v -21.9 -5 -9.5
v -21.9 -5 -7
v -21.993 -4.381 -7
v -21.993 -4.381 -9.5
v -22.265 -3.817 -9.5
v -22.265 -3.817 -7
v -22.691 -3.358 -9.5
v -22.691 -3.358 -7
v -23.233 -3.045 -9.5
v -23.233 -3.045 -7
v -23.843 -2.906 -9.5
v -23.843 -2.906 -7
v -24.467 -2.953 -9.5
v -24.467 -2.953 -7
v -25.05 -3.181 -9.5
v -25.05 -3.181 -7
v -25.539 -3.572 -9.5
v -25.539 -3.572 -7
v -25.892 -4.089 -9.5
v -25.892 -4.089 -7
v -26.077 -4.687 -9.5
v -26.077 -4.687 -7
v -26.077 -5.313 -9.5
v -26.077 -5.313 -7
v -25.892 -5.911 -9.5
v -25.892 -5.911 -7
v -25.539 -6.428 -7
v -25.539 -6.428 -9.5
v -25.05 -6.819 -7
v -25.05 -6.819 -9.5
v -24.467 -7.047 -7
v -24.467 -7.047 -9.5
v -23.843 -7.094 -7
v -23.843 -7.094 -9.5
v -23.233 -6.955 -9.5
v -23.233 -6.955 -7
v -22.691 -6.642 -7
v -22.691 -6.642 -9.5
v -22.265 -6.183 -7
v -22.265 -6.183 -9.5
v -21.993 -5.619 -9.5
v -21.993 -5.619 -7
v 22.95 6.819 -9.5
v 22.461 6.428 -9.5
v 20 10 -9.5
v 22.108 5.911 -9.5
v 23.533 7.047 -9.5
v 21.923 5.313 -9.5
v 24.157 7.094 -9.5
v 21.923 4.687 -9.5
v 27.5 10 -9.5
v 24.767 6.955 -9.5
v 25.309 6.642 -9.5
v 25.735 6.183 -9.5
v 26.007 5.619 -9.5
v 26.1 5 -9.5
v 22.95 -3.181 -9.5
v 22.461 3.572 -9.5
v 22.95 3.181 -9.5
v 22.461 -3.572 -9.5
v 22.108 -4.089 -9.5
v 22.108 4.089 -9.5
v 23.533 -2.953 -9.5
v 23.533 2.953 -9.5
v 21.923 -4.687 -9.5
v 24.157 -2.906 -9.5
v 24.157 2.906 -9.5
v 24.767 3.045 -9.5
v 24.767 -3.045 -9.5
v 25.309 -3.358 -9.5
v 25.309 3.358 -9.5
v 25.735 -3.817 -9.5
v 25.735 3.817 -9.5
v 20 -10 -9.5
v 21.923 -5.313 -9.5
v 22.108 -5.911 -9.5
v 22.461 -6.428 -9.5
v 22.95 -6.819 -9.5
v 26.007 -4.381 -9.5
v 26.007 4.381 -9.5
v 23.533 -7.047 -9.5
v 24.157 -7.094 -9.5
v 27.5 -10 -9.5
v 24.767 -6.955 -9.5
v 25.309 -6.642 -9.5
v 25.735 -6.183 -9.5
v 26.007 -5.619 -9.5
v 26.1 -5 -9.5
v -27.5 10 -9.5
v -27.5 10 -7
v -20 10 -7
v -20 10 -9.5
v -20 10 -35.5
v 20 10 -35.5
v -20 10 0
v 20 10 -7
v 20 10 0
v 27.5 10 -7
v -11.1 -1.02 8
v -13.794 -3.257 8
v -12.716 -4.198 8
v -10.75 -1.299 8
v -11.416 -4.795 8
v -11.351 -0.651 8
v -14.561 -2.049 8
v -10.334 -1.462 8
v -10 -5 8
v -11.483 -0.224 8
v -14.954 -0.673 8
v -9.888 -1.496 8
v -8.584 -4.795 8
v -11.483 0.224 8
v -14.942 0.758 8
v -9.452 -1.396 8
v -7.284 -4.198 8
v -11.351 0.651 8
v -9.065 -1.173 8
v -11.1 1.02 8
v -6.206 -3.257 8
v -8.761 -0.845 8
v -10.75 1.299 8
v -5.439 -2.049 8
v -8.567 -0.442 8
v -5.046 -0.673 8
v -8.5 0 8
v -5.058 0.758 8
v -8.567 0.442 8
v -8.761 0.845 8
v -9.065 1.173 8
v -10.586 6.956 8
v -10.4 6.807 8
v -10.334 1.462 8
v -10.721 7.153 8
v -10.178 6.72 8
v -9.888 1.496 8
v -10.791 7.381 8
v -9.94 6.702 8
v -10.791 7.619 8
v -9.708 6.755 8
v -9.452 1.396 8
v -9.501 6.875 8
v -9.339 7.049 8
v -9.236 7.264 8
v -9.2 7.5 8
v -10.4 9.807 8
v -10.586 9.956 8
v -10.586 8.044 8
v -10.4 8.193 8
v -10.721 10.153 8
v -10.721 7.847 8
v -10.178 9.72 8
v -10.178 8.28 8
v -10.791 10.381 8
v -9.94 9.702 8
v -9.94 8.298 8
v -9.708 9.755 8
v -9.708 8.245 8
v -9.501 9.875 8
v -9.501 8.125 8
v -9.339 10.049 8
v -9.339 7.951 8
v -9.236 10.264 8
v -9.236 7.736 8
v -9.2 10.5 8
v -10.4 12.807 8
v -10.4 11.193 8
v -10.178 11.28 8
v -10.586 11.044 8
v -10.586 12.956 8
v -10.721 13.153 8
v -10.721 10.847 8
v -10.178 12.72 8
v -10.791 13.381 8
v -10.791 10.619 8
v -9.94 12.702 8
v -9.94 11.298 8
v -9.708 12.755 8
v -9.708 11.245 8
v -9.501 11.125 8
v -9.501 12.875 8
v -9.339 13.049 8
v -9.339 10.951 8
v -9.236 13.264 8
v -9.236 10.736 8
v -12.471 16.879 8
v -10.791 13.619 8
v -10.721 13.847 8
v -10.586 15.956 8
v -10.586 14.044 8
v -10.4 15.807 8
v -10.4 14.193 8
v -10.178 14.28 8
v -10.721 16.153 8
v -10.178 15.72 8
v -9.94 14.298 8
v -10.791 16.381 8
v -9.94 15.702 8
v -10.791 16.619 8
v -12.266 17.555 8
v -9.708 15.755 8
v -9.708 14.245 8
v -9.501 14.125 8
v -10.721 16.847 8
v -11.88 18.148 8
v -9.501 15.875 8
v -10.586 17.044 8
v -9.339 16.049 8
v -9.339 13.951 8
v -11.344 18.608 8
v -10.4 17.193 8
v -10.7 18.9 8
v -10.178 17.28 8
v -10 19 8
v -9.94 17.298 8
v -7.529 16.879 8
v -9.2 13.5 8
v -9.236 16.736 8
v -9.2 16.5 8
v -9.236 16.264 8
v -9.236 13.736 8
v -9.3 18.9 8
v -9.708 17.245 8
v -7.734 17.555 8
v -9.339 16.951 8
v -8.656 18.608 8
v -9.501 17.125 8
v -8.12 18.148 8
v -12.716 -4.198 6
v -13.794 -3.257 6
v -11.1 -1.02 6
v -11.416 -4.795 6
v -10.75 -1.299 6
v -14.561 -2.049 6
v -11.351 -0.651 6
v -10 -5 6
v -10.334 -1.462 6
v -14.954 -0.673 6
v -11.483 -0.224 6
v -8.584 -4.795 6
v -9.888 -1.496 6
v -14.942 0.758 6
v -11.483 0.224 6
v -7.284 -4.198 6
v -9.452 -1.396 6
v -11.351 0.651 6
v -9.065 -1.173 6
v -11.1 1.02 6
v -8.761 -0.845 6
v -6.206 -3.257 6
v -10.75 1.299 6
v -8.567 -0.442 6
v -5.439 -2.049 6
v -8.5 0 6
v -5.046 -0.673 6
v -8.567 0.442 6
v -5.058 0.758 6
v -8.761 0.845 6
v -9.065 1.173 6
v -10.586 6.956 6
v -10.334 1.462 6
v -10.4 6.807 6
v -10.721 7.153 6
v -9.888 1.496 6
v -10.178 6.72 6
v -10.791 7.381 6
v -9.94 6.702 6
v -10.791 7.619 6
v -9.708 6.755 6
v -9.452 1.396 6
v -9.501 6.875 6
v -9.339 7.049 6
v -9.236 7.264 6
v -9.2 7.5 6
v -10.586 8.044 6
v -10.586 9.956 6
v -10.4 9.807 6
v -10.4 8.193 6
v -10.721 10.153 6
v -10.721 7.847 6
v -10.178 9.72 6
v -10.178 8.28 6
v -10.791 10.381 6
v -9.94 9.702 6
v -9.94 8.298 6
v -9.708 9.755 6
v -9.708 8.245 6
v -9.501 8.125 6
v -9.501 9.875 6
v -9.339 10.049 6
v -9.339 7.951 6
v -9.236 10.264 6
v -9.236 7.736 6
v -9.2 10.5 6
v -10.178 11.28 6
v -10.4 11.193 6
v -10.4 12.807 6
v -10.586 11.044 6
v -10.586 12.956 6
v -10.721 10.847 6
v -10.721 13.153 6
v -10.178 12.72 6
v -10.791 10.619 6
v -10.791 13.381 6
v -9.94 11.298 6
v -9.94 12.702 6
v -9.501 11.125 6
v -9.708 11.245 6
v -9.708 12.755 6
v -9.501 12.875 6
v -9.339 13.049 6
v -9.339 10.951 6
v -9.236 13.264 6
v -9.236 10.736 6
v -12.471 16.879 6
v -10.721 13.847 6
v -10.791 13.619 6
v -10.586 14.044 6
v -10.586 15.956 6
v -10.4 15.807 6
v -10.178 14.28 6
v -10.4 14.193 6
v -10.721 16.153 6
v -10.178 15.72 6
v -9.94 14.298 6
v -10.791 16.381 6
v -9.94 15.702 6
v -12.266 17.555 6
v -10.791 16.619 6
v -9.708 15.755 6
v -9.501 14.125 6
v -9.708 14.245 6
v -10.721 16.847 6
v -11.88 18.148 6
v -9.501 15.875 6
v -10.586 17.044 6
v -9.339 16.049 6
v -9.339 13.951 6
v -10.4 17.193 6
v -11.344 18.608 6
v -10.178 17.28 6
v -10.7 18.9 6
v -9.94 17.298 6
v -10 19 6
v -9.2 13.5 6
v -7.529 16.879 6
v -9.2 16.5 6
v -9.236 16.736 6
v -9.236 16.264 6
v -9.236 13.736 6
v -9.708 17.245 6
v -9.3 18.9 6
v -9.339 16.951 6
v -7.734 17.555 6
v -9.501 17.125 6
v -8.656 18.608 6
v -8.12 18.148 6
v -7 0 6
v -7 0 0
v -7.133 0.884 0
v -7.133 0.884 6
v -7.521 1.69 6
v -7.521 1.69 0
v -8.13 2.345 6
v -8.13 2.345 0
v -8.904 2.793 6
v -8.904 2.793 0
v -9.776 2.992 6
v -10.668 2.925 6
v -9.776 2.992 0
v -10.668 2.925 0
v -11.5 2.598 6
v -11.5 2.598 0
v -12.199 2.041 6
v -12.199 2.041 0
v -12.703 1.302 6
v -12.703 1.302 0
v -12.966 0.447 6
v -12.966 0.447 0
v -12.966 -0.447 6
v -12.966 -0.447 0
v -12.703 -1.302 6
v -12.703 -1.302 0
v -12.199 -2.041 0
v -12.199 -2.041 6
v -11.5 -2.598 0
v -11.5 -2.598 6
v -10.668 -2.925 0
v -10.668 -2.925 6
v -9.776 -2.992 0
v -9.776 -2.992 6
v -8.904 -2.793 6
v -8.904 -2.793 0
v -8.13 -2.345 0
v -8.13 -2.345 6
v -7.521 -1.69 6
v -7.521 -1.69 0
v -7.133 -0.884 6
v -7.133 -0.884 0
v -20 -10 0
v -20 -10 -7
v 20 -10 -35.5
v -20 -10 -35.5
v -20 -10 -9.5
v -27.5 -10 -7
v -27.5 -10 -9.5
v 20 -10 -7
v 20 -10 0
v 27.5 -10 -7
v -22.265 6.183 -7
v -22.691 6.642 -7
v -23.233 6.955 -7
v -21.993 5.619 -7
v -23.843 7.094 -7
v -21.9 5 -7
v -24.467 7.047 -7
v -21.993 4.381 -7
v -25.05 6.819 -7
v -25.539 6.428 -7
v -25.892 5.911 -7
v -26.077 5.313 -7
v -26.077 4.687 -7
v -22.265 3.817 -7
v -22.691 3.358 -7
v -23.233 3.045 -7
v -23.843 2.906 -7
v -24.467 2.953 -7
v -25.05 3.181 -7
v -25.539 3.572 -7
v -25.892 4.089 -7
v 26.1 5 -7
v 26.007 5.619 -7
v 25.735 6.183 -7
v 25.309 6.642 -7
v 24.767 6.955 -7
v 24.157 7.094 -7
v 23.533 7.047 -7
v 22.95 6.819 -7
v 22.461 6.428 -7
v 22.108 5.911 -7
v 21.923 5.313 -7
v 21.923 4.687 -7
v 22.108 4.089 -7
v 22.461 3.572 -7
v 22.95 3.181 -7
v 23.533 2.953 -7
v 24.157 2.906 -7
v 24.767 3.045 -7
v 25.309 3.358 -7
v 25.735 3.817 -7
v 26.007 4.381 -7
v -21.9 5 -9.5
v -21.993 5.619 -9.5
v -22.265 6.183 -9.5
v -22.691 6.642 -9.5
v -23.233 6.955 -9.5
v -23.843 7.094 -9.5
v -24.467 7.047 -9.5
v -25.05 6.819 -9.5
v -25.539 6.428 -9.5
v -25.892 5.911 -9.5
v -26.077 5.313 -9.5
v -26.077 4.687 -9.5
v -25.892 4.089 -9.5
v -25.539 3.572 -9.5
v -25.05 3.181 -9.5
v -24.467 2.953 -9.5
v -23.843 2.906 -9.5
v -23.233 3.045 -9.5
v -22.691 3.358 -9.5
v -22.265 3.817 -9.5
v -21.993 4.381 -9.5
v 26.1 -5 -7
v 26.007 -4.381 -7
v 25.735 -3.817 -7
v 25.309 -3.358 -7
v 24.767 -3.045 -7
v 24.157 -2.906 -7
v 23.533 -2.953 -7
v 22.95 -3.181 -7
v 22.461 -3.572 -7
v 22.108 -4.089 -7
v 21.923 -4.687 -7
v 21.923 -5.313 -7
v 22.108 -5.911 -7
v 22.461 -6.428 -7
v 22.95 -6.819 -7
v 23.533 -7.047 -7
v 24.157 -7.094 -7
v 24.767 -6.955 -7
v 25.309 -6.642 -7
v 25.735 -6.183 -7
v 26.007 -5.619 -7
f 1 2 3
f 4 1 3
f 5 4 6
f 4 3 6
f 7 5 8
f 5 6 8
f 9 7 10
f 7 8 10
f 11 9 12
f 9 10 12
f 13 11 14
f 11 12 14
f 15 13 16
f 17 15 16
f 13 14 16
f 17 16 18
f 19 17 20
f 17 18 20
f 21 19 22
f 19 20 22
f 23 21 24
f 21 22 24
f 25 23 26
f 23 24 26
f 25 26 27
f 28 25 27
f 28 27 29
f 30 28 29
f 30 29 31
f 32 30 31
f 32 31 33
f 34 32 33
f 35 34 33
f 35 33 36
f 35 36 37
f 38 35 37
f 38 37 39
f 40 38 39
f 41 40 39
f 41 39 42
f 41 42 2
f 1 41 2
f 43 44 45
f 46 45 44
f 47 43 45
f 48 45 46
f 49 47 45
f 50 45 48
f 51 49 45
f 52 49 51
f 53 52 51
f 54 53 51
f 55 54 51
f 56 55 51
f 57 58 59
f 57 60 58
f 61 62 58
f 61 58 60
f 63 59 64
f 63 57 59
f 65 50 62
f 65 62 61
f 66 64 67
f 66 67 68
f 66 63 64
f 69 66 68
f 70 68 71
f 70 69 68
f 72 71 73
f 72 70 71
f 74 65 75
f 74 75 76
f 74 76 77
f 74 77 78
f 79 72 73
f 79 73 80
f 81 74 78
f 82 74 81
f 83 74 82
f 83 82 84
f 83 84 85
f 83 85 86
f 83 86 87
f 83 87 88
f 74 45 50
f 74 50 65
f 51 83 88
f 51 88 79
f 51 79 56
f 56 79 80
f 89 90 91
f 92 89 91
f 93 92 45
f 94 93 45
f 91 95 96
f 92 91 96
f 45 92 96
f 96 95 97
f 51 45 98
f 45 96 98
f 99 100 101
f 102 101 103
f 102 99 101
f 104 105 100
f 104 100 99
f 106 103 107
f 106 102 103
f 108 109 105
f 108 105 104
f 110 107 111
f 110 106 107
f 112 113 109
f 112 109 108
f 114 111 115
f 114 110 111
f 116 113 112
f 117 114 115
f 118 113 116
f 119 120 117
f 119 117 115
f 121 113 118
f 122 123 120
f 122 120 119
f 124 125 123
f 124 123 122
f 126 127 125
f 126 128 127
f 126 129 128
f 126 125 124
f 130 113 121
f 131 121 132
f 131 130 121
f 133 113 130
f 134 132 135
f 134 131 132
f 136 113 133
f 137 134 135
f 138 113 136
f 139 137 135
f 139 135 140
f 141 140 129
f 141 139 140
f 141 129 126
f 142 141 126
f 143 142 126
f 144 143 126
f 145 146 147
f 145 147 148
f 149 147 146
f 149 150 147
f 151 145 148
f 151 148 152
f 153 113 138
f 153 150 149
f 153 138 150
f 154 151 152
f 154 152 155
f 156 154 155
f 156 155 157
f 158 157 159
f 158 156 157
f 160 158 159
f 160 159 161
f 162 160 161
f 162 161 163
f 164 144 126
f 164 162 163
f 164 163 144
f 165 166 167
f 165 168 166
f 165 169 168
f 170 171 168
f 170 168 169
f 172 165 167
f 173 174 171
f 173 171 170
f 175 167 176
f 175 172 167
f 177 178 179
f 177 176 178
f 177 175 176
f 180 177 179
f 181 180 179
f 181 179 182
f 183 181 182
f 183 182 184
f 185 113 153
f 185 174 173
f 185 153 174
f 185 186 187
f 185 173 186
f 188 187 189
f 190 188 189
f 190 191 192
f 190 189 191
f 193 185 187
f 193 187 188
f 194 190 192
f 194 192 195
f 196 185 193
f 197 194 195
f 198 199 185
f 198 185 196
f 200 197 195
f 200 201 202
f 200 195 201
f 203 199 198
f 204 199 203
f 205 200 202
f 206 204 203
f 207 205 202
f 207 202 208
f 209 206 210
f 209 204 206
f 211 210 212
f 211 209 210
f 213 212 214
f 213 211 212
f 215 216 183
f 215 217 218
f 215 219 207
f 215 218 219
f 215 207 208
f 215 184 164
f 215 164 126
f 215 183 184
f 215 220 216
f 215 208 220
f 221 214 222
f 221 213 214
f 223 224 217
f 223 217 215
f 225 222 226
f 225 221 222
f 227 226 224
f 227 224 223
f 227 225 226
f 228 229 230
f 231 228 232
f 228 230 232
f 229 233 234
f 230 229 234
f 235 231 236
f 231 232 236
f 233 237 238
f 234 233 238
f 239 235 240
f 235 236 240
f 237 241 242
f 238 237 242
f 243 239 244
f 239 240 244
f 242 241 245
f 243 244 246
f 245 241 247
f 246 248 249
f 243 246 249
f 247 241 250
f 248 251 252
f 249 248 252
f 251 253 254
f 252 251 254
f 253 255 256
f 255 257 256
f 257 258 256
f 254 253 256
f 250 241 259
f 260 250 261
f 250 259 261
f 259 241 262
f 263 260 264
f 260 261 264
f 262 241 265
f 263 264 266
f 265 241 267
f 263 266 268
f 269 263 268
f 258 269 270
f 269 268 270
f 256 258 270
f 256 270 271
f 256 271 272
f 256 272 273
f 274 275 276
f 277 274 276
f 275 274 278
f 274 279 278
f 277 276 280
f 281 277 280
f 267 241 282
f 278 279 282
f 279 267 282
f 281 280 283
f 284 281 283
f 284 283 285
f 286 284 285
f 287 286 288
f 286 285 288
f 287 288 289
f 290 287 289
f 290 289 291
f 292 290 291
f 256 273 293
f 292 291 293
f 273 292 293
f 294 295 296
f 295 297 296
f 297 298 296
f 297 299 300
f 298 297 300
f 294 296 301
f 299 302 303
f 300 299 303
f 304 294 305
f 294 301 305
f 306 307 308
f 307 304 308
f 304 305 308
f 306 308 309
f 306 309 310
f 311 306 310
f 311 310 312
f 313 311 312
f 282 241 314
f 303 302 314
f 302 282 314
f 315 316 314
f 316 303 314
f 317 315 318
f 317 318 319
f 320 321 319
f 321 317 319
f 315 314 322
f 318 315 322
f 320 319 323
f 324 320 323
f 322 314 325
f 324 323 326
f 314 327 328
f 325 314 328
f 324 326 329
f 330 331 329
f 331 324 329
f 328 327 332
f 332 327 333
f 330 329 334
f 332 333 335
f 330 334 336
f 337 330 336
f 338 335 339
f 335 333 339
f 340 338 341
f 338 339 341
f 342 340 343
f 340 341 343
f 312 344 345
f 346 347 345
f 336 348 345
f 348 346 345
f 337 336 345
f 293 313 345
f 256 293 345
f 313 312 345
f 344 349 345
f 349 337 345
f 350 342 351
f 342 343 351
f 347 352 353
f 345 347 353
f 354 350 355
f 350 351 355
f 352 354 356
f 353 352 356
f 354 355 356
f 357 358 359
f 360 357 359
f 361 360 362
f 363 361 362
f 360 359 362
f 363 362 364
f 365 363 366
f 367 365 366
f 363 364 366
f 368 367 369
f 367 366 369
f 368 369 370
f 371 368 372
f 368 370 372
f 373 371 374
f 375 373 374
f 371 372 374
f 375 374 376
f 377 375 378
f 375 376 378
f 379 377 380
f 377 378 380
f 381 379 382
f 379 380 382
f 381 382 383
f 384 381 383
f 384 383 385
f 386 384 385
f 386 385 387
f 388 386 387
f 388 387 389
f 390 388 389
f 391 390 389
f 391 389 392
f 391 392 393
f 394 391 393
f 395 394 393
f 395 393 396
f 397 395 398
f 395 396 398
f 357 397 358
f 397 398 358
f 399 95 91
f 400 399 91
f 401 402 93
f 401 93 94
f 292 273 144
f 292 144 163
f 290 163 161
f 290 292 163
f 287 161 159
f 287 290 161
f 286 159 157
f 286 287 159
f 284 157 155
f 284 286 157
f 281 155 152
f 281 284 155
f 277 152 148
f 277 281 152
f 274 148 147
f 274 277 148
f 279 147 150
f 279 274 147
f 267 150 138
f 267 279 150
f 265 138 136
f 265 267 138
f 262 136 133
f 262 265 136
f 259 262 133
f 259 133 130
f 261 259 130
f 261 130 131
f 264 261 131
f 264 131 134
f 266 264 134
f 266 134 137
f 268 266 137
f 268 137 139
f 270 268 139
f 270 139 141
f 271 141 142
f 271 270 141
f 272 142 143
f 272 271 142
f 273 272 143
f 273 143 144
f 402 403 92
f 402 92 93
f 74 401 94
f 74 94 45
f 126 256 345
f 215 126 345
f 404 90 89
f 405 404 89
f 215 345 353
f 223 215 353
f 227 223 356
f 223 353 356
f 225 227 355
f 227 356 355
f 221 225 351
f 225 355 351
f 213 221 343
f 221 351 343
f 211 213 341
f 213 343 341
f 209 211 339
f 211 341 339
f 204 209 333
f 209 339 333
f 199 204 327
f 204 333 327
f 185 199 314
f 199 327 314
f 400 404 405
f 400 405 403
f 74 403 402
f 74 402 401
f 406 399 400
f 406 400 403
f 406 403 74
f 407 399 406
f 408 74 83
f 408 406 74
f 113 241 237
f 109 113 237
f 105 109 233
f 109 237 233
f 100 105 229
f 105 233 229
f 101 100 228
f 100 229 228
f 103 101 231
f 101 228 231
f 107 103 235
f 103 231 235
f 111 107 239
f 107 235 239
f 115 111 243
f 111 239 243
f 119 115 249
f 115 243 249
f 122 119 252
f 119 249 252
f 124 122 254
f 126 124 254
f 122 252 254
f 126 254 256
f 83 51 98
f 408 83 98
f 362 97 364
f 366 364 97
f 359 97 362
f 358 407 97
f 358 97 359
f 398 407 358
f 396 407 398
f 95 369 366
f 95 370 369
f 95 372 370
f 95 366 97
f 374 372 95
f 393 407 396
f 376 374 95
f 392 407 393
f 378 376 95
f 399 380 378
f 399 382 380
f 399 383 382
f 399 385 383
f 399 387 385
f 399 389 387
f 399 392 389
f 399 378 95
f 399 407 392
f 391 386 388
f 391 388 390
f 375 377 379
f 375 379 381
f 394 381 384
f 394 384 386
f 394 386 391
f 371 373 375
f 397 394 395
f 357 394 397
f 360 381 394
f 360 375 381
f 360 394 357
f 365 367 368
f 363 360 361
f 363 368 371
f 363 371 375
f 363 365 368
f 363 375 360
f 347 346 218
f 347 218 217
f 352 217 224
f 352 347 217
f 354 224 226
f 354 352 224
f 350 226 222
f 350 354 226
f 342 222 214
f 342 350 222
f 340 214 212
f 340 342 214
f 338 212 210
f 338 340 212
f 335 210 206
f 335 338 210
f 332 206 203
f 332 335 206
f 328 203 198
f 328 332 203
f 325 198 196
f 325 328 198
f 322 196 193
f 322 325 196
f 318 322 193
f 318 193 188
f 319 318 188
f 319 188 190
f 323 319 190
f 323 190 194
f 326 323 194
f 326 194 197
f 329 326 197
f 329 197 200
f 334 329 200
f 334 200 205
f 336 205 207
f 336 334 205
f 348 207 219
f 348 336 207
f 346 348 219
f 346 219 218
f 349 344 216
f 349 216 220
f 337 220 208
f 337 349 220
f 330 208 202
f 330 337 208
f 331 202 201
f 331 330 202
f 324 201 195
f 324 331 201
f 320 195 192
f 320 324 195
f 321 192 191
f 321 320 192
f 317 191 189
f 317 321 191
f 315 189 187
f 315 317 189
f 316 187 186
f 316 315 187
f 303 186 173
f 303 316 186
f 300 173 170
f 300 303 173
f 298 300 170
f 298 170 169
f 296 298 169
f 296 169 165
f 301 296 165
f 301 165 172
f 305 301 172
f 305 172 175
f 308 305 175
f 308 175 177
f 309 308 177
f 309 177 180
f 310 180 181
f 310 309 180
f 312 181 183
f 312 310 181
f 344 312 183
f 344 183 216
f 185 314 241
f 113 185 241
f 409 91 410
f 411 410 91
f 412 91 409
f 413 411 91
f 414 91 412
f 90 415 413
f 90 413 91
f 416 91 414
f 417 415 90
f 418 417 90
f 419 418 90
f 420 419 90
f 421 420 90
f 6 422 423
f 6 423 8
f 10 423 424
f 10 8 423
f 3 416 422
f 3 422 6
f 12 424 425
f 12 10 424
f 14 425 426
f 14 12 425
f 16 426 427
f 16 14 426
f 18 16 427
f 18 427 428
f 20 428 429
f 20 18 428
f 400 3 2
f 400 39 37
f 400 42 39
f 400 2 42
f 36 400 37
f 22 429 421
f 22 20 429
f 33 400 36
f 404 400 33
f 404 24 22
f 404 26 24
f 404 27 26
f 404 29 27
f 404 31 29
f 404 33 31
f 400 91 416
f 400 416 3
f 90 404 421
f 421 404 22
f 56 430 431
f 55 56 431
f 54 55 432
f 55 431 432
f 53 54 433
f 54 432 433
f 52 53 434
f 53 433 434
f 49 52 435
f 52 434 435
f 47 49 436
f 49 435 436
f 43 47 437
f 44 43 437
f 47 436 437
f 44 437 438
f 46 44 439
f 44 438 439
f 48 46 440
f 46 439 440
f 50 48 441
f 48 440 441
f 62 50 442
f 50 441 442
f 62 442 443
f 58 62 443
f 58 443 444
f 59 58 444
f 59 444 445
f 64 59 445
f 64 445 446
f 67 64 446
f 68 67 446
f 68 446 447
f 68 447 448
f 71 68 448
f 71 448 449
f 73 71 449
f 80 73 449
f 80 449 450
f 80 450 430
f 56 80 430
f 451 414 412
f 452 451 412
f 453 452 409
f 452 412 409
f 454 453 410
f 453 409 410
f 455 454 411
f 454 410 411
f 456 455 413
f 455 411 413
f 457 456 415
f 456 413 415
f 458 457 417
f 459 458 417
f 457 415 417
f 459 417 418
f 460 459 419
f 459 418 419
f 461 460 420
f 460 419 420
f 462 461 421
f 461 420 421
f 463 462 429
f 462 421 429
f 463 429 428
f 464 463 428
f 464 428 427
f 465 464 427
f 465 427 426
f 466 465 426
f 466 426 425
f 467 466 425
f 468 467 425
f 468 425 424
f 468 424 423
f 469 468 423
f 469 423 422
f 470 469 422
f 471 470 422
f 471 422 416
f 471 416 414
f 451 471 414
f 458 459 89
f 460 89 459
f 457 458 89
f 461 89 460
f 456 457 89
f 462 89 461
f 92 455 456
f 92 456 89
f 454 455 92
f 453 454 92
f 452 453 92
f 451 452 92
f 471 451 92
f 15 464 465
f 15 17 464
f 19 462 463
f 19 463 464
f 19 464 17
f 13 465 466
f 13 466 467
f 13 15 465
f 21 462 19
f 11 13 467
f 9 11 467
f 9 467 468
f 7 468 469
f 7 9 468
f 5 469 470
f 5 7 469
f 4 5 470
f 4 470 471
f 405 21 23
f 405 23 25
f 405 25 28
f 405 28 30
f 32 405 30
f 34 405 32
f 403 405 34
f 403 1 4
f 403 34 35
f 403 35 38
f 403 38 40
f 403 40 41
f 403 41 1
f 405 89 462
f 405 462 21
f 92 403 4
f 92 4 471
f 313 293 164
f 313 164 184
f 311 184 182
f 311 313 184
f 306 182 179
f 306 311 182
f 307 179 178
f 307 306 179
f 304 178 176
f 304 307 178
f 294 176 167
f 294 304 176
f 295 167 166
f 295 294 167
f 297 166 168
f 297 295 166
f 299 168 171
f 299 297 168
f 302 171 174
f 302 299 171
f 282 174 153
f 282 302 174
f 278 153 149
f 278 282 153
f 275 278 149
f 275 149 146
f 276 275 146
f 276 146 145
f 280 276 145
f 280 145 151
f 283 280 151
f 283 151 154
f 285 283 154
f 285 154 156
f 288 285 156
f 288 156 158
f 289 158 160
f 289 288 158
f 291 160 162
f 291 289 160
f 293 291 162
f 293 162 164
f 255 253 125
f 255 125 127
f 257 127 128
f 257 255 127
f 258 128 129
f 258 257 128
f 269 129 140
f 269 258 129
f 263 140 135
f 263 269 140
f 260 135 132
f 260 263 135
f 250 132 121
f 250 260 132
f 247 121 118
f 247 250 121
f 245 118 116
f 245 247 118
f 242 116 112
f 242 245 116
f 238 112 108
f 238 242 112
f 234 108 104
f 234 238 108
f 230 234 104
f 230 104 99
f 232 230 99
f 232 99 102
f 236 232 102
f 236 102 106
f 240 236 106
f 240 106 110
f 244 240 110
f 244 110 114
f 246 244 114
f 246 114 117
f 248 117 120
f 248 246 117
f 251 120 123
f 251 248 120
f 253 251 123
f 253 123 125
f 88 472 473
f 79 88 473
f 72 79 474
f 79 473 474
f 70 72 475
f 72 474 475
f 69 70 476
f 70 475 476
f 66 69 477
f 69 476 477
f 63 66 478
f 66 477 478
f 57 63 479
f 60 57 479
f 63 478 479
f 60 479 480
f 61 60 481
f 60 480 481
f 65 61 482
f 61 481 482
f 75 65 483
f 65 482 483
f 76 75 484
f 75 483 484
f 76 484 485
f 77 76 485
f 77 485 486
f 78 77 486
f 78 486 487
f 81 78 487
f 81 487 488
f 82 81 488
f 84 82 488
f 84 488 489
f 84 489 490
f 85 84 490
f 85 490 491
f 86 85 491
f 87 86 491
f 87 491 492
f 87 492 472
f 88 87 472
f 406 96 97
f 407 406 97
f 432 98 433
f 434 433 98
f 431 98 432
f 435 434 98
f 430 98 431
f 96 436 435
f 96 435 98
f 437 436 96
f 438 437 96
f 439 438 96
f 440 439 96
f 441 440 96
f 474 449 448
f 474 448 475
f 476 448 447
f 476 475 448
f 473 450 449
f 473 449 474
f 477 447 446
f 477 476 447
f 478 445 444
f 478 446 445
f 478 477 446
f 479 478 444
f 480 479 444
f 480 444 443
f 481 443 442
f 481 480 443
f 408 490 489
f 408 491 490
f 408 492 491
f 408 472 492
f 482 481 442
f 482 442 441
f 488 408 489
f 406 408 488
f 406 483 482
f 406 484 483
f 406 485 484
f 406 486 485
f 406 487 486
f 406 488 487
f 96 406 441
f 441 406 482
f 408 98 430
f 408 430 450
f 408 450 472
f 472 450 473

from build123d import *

# Parameters (mm, degrees)
F1_DEPTH = 10
F2_R     = 3
F3_DEPTH = 6
F4_R     = 2.1
F5_DEPTH = 28.501
F6_R     = 3
F6_R_2   = 0.8
F6_R_3   = 1.5
F7_DEPTH = 2


with BuildPart() as f1:
    # F0 (on Front) → F1 (new body, symmetric)
    with BuildSketch(Plane.XZ):
        Polygon((20, 0), (0, 0), (-20, 0), (-20, -7), (-27.5, -7), (-27.5, -9.5), (-20, -9.5), (-20, -35.5), (0, -35.5), (20, -35.5), (20, -9.5), (27.5, -9.5), (27.5, -7), (20, -7), align=None)
    extrude(amount=F1_DEPTH, both=True)

    # F2 (on face) → F3 (join)
    with BuildSketch(Plane.XY):
        with Locations((-10, 0)):
            Circle(F2_R)
    extrude(amount=F3_DEPTH)

    # F4 (on face) → F5 (cut, through all)
    with BuildSketch(Plane.XY.offset(-7)):
        with Locations((-24, 5)):
            Circle(F4_R)
        with Locations((-24, -5)):
            Circle(F4_R)
        with Locations((24, 5)):
            Circle(F4_R)
        with Locations((24, -5)):
            Circle(F4_R)
    extrude(amount=-F5_DEPTH, mode=Mode.SUBTRACT)


with BuildPart() as f7:
    # F6 (on face) → F7 (new body)
    with BuildSketch(Plane.XY.offset(6)):
        with BuildLine():
            Line((-5.057725, 0.757576), (-7.528863, 16.878788))
            ThreePointArc((-7.528863, 16.878788), (-10, 19), (-12.471137, 16.878788))
            Line((-12.471137, 16.878788), (-14.942275, 0.757576))
            ThreePointArc((-14.942275, 0.757576), (-10, -5), (-5.057725, 0.757576))
        make_face()
        with Locations((-10, 0)):
            Circle(F6_R, mode=Mode.SUBTRACT)
        with Locations((-10, 7.5)):
            Circle(F6_R_2, mode=Mode.SUBTRACT)
        with Locations((-10, 10.5)):
            Circle(F6_R_2, mode=Mode.SUBTRACT)
        with Locations((-10, 13.5)):
            Circle(F6_R_2, mode=Mode.SUBTRACT)
        with Locations((-10, 16.5)):
            Circle(F6_R_2, mode=Mode.SUBTRACT)
        with Locations((-10, 0)):
            Circle(F6_R)
        with Locations((-10, 0)):
            Circle(F6_R_3, mode=Mode.SUBTRACT)
    extrude(amount=F7_DEPTH)


solid = Compound([f1.part, f7.part])
